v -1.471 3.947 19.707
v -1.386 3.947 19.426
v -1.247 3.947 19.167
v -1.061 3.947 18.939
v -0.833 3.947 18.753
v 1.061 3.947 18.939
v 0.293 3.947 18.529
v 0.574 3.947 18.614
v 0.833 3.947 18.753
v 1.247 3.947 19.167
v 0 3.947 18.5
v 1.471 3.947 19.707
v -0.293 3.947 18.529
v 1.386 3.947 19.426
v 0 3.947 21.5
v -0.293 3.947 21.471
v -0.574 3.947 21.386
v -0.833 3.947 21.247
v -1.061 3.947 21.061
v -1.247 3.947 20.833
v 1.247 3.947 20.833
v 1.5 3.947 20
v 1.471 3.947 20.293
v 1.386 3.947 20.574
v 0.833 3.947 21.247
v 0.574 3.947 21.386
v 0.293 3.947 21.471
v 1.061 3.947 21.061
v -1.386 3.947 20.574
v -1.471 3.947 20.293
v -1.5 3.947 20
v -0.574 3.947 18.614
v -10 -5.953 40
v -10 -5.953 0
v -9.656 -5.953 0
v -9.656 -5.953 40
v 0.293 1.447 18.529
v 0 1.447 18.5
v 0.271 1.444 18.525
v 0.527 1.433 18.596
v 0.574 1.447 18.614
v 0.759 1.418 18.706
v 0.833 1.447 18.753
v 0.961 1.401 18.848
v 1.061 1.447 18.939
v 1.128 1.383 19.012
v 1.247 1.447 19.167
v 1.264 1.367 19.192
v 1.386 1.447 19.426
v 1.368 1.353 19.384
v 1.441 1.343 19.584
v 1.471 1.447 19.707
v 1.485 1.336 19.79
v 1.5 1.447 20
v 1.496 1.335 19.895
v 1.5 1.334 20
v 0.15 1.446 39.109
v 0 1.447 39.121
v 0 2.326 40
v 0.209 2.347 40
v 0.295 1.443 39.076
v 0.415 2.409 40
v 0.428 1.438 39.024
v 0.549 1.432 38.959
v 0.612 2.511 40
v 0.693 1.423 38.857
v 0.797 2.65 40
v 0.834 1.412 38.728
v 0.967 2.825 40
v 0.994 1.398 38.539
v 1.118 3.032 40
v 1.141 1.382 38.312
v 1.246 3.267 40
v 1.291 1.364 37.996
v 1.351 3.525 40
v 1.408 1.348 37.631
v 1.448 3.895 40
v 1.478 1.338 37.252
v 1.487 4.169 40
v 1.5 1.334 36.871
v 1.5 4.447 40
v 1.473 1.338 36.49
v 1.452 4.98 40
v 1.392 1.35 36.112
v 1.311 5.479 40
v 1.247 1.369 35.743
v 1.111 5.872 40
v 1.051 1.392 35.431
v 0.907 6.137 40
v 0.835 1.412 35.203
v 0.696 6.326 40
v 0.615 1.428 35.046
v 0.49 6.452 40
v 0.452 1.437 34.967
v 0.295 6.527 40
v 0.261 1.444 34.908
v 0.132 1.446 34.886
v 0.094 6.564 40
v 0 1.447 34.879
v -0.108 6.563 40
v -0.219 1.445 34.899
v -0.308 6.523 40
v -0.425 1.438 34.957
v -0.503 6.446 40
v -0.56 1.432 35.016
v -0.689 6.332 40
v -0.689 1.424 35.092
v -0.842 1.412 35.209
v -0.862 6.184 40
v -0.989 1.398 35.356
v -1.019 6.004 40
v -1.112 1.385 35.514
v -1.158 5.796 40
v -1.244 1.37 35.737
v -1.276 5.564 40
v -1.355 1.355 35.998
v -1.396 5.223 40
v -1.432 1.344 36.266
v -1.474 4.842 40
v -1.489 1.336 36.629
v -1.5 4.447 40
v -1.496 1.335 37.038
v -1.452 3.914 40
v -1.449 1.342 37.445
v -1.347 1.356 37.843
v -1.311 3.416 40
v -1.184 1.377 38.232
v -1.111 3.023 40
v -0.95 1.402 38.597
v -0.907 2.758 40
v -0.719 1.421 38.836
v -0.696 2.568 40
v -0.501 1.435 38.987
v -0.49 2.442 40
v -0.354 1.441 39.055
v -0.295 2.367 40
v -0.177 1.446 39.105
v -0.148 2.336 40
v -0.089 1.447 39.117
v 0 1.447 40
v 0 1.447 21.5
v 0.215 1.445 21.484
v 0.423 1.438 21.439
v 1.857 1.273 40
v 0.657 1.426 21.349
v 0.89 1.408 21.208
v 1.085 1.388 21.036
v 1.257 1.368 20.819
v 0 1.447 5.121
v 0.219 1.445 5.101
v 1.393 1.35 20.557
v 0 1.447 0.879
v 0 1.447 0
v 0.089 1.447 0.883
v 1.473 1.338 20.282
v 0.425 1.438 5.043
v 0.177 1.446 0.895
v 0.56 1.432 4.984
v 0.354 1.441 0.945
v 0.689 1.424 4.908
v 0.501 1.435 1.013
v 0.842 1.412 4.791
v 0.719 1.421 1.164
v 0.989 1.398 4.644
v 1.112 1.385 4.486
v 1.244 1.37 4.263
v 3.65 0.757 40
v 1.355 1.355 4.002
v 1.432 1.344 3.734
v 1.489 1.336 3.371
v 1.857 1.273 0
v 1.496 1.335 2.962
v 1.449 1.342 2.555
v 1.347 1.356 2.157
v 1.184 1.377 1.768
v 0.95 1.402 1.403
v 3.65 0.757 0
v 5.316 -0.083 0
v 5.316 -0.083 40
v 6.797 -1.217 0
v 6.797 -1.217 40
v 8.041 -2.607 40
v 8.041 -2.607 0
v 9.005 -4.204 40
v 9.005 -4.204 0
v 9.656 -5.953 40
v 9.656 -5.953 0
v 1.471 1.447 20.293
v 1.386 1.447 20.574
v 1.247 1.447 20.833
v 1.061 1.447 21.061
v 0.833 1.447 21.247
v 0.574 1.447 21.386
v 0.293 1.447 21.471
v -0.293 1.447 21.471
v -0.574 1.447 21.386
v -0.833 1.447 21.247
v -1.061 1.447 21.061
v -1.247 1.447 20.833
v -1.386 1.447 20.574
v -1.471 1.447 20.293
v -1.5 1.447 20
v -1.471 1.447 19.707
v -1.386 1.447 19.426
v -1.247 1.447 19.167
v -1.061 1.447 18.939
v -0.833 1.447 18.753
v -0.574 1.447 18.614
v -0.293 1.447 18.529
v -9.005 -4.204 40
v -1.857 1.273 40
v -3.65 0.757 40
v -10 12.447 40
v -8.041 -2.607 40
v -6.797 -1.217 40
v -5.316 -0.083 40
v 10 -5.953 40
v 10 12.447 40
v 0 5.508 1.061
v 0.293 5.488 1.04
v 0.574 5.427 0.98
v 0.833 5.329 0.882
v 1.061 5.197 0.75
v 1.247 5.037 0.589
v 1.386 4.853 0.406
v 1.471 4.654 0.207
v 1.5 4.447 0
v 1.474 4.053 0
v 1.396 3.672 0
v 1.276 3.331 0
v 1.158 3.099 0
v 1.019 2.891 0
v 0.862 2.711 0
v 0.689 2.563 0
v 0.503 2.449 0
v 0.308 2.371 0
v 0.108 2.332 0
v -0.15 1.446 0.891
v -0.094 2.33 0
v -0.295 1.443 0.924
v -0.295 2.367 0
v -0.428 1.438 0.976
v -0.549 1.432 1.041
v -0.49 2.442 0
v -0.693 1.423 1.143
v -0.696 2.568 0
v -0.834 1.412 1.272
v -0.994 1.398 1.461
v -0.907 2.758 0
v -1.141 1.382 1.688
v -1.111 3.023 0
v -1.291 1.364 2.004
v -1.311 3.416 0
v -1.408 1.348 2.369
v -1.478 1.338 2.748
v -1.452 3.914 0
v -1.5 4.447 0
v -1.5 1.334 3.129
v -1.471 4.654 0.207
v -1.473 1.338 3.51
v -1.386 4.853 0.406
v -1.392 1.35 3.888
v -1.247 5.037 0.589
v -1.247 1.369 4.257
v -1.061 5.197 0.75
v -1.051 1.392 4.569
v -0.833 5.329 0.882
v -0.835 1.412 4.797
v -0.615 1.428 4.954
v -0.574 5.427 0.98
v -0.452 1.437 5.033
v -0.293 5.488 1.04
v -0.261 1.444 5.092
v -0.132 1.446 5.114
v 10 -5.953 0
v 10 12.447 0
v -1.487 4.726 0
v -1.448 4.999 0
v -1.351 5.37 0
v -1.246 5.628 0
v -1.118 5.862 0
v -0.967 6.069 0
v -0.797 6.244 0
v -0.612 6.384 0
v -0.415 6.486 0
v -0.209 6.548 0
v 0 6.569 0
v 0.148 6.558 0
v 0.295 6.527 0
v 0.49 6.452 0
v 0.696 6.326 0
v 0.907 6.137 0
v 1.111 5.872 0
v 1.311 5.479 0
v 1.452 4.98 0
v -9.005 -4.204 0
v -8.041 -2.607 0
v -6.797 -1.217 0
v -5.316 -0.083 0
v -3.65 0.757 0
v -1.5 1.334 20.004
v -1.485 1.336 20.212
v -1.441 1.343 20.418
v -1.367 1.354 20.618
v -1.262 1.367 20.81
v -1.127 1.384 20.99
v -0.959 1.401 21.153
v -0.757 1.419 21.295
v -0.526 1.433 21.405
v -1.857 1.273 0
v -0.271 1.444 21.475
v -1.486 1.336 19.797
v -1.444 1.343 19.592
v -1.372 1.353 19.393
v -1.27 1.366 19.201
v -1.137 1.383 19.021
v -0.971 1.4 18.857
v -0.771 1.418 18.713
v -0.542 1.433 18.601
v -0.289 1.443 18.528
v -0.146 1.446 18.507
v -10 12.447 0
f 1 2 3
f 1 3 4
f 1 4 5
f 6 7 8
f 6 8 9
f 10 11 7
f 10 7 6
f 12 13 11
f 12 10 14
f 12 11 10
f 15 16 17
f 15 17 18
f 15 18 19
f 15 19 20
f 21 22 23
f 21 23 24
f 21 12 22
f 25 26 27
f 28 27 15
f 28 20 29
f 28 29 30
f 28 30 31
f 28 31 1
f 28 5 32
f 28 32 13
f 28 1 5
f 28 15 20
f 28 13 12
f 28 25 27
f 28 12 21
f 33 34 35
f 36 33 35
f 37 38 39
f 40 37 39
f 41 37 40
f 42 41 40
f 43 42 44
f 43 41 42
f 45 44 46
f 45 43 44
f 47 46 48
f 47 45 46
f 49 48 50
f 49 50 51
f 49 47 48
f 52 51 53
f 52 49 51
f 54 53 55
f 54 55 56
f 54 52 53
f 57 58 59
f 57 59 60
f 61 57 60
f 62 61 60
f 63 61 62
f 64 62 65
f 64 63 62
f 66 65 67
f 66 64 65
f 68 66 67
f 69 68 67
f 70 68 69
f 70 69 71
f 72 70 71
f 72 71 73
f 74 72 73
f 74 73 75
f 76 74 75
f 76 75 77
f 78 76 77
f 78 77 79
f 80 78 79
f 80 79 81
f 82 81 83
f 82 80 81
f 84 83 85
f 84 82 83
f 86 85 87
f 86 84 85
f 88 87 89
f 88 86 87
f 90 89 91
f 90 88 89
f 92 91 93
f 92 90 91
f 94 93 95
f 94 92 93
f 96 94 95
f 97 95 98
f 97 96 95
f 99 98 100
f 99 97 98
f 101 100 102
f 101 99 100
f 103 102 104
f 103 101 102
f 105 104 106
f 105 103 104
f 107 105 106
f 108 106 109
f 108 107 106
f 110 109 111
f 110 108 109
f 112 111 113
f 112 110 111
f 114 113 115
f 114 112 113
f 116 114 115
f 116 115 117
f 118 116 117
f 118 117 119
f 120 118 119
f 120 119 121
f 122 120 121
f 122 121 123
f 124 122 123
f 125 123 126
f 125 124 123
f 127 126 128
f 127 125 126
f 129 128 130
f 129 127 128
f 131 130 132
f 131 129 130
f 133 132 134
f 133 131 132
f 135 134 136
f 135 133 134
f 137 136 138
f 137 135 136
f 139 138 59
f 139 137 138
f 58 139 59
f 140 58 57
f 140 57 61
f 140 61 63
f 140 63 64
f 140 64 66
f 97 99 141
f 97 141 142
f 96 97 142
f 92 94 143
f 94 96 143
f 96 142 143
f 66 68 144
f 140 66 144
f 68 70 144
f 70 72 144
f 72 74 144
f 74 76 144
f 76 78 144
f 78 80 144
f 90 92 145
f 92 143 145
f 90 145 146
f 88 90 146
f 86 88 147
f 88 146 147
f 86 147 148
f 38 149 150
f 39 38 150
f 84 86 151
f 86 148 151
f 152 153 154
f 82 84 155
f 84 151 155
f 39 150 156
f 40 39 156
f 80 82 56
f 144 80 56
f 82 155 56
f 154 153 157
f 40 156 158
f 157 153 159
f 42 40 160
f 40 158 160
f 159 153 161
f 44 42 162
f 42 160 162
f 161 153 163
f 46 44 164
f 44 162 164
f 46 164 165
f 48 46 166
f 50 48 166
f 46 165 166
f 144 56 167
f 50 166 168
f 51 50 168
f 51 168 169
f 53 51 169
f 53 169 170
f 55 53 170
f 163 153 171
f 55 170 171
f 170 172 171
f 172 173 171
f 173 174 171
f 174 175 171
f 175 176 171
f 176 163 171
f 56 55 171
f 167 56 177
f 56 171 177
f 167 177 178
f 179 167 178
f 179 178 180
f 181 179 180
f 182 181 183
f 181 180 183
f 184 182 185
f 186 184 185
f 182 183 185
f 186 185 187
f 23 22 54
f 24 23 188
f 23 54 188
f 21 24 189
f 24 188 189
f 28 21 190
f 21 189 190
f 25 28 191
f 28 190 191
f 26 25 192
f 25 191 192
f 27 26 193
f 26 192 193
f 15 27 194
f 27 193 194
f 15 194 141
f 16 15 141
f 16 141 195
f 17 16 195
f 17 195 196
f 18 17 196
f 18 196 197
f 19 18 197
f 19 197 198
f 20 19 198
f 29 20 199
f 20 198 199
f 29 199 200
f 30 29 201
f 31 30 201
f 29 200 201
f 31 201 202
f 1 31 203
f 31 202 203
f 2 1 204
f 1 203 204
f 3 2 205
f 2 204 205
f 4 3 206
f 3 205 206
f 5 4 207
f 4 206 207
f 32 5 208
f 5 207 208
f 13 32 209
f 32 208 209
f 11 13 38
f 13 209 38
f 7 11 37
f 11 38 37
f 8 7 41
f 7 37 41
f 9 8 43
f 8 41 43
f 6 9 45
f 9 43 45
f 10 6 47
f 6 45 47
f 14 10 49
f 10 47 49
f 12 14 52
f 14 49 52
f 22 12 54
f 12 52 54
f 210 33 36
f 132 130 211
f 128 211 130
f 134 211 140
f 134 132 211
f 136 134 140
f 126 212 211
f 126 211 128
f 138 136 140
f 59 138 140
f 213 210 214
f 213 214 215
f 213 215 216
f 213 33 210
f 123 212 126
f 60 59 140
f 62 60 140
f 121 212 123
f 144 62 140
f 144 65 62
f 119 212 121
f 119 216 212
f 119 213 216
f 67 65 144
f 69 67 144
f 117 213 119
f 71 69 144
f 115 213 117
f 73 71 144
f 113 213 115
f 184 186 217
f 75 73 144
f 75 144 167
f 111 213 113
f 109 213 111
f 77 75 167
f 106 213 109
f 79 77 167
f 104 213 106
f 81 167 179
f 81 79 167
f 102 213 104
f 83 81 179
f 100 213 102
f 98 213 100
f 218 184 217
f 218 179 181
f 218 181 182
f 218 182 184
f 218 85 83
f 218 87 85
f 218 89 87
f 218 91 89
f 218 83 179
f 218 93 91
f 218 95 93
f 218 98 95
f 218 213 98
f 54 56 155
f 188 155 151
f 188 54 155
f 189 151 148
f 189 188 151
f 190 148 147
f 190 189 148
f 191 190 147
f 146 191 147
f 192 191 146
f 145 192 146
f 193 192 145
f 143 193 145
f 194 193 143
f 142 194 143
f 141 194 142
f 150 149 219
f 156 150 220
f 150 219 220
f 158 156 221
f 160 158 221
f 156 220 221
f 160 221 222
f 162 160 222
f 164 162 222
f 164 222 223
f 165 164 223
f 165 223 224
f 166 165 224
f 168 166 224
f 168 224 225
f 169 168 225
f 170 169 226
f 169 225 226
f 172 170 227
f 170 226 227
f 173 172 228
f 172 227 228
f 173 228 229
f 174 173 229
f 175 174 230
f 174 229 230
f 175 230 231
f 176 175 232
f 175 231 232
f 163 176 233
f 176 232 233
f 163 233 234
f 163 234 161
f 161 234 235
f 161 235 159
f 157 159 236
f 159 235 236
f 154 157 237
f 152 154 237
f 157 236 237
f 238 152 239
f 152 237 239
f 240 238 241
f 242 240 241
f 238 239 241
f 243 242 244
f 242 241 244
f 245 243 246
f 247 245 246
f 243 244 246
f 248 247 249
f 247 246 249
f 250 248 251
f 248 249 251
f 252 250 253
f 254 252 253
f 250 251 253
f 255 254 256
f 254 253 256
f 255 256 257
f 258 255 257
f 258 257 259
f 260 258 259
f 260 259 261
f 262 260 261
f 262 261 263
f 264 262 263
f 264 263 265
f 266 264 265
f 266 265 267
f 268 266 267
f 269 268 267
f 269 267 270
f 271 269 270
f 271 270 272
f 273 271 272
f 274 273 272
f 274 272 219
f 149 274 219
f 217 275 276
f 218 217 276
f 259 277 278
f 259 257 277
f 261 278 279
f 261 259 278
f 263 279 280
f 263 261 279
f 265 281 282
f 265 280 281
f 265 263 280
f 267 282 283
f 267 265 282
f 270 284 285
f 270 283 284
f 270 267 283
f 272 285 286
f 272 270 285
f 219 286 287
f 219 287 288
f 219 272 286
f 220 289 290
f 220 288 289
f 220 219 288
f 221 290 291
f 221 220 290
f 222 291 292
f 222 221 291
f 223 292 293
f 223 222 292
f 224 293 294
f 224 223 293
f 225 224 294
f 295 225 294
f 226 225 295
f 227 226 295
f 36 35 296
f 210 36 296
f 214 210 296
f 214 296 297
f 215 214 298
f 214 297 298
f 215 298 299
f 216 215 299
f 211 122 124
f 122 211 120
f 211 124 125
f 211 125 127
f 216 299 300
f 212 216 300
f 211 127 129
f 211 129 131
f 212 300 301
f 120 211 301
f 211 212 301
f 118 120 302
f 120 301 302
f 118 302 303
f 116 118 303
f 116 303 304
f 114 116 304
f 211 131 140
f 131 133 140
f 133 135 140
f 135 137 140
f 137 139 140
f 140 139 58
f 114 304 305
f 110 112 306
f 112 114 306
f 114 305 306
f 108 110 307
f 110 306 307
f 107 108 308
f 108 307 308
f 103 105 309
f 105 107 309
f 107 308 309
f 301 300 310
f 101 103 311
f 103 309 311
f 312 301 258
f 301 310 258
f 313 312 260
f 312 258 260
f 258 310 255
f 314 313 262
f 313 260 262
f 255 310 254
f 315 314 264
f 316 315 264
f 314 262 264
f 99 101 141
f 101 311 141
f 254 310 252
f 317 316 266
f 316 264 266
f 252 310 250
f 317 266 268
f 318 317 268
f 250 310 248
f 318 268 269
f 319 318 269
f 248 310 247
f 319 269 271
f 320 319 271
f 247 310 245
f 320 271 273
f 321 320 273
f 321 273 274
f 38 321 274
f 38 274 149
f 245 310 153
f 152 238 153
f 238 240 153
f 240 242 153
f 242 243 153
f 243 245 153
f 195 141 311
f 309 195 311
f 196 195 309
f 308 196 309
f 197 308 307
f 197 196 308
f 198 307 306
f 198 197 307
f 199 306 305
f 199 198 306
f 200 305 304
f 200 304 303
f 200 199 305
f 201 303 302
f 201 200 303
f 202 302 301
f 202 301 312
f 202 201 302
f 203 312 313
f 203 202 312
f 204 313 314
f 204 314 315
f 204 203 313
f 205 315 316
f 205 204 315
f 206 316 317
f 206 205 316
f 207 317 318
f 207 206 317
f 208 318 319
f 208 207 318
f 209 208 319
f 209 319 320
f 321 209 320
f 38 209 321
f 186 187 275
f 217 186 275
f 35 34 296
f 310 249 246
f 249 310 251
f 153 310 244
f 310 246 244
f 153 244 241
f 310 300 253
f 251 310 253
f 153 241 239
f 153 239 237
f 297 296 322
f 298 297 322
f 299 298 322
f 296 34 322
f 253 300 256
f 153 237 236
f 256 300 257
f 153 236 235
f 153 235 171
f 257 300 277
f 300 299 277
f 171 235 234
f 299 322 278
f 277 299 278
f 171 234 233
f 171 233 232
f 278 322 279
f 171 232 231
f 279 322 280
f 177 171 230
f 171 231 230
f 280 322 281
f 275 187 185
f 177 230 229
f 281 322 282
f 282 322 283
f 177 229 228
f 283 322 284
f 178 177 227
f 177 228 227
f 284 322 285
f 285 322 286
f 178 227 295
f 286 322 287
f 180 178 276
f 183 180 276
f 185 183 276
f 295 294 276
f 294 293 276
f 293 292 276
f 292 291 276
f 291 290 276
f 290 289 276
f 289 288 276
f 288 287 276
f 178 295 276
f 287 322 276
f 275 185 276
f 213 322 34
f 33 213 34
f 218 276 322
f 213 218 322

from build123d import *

# Parameters (mm, degrees)
BOSS_EXTRUDE1_DEPTH     = 40
CUT_EXTRUDE4_DEPTH      = 38.253149736
CUT_EXTRUDE4_DEPTH_BACK = 38.253149736
SKETCH6_R               = 1.5
CUT_EXTRUDE5_DEPTH      = 45.579827261
CUT_EXTRUDE5_DEPTH_BACK = 45.579827261
SKETCH9_R               = 1.5
CUT_EXTRUDE8_DEPTH      = 10
CUT_EXTRUDE8_DEPTH_BACK = 2.5
SKETCH16_R              = 1.5


with BuildPart() as part:
    # Sketch2 → Boss-Extrude1 (new body)
    with BuildSketch(Plane.XY):
        with BuildLine():
            Line((10, 12.44732577), (-10, 12.44732577))
            Line((-10, 12.44732577), (-10, -5.95267423))
            Line((-10, -5.95267423), (-9.656086164, -5.95267423))
            ThreePointArc((-9.656086164, -5.95267423), (0, 1.44732577), (9.656086164, -5.95267423))
            Line((9.656086164, -5.95267423), (10, -5.95267423))
            Line((10, -5.95267423), (10, 12.44732577))
        make_face()
    extrude(amount=BOSS_EXTRUDE1_DEPTH)

    # Sketch6 → Cut-Extrude4 (cut, two sides: drawn at the far end of the back side and taken through both)
    with BuildSketch(Plane(origin=(0, 22.223662885, 22.223662885), x_dir=(0, -0.707106781186549, 0.7071067811865461), z_dir=(0, 0.7071067811865461, 0.707106781186549)).offset(-CUT_EXTRUDE4_DEPTH_BACK)):
        with Locations((25.139537037, 0)):
            Circle(SKETCH6_R)
    extrude(amount=CUT_EXTRUDE4_DEPTH + CUT_EXTRUDE4_DEPTH_BACK, mode=Mode.SUBTRACT)

    # Sketch9 → Cut-Extrude5 (cut, two sides: drawn at the far end of the back side and taken through both)
    with BuildSketch(Plane(origin=(0, 2.223662885, -2.223662885), x_dir=(0, 0.7071067811865389, 0.7071067811865562), z_dir=(0, 0.7071067811865562, -0.7071067811865389)).offset(-CUT_EXTRUDE5_DEPTH_BACK)):
        with Locations((3.14473421, 0)):
            Circle(SKETCH9_R)
    extrude(amount=CUT_EXTRUDE5_DEPTH + CUT_EXTRUDE5_DEPTH_BACK, mode=Mode.SUBTRACT)

    # Sketch16 → Cut-Extrude8 (cut, two sides: drawn at the far end of the back side and taken through both)
    with BuildSketch(Plane.XZ.offset(-1.44732577).offset(-CUT_EXTRUDE8_DEPTH_BACK)):
        with Locations((0, 20)):
            Circle(SKETCH16_R)
    extrude(amount=CUT_EXTRUDE8_DEPTH + CUT_EXTRUDE8_DEPTH_BACK, mode=Mode.SUBTRACT)


solid = part.part
